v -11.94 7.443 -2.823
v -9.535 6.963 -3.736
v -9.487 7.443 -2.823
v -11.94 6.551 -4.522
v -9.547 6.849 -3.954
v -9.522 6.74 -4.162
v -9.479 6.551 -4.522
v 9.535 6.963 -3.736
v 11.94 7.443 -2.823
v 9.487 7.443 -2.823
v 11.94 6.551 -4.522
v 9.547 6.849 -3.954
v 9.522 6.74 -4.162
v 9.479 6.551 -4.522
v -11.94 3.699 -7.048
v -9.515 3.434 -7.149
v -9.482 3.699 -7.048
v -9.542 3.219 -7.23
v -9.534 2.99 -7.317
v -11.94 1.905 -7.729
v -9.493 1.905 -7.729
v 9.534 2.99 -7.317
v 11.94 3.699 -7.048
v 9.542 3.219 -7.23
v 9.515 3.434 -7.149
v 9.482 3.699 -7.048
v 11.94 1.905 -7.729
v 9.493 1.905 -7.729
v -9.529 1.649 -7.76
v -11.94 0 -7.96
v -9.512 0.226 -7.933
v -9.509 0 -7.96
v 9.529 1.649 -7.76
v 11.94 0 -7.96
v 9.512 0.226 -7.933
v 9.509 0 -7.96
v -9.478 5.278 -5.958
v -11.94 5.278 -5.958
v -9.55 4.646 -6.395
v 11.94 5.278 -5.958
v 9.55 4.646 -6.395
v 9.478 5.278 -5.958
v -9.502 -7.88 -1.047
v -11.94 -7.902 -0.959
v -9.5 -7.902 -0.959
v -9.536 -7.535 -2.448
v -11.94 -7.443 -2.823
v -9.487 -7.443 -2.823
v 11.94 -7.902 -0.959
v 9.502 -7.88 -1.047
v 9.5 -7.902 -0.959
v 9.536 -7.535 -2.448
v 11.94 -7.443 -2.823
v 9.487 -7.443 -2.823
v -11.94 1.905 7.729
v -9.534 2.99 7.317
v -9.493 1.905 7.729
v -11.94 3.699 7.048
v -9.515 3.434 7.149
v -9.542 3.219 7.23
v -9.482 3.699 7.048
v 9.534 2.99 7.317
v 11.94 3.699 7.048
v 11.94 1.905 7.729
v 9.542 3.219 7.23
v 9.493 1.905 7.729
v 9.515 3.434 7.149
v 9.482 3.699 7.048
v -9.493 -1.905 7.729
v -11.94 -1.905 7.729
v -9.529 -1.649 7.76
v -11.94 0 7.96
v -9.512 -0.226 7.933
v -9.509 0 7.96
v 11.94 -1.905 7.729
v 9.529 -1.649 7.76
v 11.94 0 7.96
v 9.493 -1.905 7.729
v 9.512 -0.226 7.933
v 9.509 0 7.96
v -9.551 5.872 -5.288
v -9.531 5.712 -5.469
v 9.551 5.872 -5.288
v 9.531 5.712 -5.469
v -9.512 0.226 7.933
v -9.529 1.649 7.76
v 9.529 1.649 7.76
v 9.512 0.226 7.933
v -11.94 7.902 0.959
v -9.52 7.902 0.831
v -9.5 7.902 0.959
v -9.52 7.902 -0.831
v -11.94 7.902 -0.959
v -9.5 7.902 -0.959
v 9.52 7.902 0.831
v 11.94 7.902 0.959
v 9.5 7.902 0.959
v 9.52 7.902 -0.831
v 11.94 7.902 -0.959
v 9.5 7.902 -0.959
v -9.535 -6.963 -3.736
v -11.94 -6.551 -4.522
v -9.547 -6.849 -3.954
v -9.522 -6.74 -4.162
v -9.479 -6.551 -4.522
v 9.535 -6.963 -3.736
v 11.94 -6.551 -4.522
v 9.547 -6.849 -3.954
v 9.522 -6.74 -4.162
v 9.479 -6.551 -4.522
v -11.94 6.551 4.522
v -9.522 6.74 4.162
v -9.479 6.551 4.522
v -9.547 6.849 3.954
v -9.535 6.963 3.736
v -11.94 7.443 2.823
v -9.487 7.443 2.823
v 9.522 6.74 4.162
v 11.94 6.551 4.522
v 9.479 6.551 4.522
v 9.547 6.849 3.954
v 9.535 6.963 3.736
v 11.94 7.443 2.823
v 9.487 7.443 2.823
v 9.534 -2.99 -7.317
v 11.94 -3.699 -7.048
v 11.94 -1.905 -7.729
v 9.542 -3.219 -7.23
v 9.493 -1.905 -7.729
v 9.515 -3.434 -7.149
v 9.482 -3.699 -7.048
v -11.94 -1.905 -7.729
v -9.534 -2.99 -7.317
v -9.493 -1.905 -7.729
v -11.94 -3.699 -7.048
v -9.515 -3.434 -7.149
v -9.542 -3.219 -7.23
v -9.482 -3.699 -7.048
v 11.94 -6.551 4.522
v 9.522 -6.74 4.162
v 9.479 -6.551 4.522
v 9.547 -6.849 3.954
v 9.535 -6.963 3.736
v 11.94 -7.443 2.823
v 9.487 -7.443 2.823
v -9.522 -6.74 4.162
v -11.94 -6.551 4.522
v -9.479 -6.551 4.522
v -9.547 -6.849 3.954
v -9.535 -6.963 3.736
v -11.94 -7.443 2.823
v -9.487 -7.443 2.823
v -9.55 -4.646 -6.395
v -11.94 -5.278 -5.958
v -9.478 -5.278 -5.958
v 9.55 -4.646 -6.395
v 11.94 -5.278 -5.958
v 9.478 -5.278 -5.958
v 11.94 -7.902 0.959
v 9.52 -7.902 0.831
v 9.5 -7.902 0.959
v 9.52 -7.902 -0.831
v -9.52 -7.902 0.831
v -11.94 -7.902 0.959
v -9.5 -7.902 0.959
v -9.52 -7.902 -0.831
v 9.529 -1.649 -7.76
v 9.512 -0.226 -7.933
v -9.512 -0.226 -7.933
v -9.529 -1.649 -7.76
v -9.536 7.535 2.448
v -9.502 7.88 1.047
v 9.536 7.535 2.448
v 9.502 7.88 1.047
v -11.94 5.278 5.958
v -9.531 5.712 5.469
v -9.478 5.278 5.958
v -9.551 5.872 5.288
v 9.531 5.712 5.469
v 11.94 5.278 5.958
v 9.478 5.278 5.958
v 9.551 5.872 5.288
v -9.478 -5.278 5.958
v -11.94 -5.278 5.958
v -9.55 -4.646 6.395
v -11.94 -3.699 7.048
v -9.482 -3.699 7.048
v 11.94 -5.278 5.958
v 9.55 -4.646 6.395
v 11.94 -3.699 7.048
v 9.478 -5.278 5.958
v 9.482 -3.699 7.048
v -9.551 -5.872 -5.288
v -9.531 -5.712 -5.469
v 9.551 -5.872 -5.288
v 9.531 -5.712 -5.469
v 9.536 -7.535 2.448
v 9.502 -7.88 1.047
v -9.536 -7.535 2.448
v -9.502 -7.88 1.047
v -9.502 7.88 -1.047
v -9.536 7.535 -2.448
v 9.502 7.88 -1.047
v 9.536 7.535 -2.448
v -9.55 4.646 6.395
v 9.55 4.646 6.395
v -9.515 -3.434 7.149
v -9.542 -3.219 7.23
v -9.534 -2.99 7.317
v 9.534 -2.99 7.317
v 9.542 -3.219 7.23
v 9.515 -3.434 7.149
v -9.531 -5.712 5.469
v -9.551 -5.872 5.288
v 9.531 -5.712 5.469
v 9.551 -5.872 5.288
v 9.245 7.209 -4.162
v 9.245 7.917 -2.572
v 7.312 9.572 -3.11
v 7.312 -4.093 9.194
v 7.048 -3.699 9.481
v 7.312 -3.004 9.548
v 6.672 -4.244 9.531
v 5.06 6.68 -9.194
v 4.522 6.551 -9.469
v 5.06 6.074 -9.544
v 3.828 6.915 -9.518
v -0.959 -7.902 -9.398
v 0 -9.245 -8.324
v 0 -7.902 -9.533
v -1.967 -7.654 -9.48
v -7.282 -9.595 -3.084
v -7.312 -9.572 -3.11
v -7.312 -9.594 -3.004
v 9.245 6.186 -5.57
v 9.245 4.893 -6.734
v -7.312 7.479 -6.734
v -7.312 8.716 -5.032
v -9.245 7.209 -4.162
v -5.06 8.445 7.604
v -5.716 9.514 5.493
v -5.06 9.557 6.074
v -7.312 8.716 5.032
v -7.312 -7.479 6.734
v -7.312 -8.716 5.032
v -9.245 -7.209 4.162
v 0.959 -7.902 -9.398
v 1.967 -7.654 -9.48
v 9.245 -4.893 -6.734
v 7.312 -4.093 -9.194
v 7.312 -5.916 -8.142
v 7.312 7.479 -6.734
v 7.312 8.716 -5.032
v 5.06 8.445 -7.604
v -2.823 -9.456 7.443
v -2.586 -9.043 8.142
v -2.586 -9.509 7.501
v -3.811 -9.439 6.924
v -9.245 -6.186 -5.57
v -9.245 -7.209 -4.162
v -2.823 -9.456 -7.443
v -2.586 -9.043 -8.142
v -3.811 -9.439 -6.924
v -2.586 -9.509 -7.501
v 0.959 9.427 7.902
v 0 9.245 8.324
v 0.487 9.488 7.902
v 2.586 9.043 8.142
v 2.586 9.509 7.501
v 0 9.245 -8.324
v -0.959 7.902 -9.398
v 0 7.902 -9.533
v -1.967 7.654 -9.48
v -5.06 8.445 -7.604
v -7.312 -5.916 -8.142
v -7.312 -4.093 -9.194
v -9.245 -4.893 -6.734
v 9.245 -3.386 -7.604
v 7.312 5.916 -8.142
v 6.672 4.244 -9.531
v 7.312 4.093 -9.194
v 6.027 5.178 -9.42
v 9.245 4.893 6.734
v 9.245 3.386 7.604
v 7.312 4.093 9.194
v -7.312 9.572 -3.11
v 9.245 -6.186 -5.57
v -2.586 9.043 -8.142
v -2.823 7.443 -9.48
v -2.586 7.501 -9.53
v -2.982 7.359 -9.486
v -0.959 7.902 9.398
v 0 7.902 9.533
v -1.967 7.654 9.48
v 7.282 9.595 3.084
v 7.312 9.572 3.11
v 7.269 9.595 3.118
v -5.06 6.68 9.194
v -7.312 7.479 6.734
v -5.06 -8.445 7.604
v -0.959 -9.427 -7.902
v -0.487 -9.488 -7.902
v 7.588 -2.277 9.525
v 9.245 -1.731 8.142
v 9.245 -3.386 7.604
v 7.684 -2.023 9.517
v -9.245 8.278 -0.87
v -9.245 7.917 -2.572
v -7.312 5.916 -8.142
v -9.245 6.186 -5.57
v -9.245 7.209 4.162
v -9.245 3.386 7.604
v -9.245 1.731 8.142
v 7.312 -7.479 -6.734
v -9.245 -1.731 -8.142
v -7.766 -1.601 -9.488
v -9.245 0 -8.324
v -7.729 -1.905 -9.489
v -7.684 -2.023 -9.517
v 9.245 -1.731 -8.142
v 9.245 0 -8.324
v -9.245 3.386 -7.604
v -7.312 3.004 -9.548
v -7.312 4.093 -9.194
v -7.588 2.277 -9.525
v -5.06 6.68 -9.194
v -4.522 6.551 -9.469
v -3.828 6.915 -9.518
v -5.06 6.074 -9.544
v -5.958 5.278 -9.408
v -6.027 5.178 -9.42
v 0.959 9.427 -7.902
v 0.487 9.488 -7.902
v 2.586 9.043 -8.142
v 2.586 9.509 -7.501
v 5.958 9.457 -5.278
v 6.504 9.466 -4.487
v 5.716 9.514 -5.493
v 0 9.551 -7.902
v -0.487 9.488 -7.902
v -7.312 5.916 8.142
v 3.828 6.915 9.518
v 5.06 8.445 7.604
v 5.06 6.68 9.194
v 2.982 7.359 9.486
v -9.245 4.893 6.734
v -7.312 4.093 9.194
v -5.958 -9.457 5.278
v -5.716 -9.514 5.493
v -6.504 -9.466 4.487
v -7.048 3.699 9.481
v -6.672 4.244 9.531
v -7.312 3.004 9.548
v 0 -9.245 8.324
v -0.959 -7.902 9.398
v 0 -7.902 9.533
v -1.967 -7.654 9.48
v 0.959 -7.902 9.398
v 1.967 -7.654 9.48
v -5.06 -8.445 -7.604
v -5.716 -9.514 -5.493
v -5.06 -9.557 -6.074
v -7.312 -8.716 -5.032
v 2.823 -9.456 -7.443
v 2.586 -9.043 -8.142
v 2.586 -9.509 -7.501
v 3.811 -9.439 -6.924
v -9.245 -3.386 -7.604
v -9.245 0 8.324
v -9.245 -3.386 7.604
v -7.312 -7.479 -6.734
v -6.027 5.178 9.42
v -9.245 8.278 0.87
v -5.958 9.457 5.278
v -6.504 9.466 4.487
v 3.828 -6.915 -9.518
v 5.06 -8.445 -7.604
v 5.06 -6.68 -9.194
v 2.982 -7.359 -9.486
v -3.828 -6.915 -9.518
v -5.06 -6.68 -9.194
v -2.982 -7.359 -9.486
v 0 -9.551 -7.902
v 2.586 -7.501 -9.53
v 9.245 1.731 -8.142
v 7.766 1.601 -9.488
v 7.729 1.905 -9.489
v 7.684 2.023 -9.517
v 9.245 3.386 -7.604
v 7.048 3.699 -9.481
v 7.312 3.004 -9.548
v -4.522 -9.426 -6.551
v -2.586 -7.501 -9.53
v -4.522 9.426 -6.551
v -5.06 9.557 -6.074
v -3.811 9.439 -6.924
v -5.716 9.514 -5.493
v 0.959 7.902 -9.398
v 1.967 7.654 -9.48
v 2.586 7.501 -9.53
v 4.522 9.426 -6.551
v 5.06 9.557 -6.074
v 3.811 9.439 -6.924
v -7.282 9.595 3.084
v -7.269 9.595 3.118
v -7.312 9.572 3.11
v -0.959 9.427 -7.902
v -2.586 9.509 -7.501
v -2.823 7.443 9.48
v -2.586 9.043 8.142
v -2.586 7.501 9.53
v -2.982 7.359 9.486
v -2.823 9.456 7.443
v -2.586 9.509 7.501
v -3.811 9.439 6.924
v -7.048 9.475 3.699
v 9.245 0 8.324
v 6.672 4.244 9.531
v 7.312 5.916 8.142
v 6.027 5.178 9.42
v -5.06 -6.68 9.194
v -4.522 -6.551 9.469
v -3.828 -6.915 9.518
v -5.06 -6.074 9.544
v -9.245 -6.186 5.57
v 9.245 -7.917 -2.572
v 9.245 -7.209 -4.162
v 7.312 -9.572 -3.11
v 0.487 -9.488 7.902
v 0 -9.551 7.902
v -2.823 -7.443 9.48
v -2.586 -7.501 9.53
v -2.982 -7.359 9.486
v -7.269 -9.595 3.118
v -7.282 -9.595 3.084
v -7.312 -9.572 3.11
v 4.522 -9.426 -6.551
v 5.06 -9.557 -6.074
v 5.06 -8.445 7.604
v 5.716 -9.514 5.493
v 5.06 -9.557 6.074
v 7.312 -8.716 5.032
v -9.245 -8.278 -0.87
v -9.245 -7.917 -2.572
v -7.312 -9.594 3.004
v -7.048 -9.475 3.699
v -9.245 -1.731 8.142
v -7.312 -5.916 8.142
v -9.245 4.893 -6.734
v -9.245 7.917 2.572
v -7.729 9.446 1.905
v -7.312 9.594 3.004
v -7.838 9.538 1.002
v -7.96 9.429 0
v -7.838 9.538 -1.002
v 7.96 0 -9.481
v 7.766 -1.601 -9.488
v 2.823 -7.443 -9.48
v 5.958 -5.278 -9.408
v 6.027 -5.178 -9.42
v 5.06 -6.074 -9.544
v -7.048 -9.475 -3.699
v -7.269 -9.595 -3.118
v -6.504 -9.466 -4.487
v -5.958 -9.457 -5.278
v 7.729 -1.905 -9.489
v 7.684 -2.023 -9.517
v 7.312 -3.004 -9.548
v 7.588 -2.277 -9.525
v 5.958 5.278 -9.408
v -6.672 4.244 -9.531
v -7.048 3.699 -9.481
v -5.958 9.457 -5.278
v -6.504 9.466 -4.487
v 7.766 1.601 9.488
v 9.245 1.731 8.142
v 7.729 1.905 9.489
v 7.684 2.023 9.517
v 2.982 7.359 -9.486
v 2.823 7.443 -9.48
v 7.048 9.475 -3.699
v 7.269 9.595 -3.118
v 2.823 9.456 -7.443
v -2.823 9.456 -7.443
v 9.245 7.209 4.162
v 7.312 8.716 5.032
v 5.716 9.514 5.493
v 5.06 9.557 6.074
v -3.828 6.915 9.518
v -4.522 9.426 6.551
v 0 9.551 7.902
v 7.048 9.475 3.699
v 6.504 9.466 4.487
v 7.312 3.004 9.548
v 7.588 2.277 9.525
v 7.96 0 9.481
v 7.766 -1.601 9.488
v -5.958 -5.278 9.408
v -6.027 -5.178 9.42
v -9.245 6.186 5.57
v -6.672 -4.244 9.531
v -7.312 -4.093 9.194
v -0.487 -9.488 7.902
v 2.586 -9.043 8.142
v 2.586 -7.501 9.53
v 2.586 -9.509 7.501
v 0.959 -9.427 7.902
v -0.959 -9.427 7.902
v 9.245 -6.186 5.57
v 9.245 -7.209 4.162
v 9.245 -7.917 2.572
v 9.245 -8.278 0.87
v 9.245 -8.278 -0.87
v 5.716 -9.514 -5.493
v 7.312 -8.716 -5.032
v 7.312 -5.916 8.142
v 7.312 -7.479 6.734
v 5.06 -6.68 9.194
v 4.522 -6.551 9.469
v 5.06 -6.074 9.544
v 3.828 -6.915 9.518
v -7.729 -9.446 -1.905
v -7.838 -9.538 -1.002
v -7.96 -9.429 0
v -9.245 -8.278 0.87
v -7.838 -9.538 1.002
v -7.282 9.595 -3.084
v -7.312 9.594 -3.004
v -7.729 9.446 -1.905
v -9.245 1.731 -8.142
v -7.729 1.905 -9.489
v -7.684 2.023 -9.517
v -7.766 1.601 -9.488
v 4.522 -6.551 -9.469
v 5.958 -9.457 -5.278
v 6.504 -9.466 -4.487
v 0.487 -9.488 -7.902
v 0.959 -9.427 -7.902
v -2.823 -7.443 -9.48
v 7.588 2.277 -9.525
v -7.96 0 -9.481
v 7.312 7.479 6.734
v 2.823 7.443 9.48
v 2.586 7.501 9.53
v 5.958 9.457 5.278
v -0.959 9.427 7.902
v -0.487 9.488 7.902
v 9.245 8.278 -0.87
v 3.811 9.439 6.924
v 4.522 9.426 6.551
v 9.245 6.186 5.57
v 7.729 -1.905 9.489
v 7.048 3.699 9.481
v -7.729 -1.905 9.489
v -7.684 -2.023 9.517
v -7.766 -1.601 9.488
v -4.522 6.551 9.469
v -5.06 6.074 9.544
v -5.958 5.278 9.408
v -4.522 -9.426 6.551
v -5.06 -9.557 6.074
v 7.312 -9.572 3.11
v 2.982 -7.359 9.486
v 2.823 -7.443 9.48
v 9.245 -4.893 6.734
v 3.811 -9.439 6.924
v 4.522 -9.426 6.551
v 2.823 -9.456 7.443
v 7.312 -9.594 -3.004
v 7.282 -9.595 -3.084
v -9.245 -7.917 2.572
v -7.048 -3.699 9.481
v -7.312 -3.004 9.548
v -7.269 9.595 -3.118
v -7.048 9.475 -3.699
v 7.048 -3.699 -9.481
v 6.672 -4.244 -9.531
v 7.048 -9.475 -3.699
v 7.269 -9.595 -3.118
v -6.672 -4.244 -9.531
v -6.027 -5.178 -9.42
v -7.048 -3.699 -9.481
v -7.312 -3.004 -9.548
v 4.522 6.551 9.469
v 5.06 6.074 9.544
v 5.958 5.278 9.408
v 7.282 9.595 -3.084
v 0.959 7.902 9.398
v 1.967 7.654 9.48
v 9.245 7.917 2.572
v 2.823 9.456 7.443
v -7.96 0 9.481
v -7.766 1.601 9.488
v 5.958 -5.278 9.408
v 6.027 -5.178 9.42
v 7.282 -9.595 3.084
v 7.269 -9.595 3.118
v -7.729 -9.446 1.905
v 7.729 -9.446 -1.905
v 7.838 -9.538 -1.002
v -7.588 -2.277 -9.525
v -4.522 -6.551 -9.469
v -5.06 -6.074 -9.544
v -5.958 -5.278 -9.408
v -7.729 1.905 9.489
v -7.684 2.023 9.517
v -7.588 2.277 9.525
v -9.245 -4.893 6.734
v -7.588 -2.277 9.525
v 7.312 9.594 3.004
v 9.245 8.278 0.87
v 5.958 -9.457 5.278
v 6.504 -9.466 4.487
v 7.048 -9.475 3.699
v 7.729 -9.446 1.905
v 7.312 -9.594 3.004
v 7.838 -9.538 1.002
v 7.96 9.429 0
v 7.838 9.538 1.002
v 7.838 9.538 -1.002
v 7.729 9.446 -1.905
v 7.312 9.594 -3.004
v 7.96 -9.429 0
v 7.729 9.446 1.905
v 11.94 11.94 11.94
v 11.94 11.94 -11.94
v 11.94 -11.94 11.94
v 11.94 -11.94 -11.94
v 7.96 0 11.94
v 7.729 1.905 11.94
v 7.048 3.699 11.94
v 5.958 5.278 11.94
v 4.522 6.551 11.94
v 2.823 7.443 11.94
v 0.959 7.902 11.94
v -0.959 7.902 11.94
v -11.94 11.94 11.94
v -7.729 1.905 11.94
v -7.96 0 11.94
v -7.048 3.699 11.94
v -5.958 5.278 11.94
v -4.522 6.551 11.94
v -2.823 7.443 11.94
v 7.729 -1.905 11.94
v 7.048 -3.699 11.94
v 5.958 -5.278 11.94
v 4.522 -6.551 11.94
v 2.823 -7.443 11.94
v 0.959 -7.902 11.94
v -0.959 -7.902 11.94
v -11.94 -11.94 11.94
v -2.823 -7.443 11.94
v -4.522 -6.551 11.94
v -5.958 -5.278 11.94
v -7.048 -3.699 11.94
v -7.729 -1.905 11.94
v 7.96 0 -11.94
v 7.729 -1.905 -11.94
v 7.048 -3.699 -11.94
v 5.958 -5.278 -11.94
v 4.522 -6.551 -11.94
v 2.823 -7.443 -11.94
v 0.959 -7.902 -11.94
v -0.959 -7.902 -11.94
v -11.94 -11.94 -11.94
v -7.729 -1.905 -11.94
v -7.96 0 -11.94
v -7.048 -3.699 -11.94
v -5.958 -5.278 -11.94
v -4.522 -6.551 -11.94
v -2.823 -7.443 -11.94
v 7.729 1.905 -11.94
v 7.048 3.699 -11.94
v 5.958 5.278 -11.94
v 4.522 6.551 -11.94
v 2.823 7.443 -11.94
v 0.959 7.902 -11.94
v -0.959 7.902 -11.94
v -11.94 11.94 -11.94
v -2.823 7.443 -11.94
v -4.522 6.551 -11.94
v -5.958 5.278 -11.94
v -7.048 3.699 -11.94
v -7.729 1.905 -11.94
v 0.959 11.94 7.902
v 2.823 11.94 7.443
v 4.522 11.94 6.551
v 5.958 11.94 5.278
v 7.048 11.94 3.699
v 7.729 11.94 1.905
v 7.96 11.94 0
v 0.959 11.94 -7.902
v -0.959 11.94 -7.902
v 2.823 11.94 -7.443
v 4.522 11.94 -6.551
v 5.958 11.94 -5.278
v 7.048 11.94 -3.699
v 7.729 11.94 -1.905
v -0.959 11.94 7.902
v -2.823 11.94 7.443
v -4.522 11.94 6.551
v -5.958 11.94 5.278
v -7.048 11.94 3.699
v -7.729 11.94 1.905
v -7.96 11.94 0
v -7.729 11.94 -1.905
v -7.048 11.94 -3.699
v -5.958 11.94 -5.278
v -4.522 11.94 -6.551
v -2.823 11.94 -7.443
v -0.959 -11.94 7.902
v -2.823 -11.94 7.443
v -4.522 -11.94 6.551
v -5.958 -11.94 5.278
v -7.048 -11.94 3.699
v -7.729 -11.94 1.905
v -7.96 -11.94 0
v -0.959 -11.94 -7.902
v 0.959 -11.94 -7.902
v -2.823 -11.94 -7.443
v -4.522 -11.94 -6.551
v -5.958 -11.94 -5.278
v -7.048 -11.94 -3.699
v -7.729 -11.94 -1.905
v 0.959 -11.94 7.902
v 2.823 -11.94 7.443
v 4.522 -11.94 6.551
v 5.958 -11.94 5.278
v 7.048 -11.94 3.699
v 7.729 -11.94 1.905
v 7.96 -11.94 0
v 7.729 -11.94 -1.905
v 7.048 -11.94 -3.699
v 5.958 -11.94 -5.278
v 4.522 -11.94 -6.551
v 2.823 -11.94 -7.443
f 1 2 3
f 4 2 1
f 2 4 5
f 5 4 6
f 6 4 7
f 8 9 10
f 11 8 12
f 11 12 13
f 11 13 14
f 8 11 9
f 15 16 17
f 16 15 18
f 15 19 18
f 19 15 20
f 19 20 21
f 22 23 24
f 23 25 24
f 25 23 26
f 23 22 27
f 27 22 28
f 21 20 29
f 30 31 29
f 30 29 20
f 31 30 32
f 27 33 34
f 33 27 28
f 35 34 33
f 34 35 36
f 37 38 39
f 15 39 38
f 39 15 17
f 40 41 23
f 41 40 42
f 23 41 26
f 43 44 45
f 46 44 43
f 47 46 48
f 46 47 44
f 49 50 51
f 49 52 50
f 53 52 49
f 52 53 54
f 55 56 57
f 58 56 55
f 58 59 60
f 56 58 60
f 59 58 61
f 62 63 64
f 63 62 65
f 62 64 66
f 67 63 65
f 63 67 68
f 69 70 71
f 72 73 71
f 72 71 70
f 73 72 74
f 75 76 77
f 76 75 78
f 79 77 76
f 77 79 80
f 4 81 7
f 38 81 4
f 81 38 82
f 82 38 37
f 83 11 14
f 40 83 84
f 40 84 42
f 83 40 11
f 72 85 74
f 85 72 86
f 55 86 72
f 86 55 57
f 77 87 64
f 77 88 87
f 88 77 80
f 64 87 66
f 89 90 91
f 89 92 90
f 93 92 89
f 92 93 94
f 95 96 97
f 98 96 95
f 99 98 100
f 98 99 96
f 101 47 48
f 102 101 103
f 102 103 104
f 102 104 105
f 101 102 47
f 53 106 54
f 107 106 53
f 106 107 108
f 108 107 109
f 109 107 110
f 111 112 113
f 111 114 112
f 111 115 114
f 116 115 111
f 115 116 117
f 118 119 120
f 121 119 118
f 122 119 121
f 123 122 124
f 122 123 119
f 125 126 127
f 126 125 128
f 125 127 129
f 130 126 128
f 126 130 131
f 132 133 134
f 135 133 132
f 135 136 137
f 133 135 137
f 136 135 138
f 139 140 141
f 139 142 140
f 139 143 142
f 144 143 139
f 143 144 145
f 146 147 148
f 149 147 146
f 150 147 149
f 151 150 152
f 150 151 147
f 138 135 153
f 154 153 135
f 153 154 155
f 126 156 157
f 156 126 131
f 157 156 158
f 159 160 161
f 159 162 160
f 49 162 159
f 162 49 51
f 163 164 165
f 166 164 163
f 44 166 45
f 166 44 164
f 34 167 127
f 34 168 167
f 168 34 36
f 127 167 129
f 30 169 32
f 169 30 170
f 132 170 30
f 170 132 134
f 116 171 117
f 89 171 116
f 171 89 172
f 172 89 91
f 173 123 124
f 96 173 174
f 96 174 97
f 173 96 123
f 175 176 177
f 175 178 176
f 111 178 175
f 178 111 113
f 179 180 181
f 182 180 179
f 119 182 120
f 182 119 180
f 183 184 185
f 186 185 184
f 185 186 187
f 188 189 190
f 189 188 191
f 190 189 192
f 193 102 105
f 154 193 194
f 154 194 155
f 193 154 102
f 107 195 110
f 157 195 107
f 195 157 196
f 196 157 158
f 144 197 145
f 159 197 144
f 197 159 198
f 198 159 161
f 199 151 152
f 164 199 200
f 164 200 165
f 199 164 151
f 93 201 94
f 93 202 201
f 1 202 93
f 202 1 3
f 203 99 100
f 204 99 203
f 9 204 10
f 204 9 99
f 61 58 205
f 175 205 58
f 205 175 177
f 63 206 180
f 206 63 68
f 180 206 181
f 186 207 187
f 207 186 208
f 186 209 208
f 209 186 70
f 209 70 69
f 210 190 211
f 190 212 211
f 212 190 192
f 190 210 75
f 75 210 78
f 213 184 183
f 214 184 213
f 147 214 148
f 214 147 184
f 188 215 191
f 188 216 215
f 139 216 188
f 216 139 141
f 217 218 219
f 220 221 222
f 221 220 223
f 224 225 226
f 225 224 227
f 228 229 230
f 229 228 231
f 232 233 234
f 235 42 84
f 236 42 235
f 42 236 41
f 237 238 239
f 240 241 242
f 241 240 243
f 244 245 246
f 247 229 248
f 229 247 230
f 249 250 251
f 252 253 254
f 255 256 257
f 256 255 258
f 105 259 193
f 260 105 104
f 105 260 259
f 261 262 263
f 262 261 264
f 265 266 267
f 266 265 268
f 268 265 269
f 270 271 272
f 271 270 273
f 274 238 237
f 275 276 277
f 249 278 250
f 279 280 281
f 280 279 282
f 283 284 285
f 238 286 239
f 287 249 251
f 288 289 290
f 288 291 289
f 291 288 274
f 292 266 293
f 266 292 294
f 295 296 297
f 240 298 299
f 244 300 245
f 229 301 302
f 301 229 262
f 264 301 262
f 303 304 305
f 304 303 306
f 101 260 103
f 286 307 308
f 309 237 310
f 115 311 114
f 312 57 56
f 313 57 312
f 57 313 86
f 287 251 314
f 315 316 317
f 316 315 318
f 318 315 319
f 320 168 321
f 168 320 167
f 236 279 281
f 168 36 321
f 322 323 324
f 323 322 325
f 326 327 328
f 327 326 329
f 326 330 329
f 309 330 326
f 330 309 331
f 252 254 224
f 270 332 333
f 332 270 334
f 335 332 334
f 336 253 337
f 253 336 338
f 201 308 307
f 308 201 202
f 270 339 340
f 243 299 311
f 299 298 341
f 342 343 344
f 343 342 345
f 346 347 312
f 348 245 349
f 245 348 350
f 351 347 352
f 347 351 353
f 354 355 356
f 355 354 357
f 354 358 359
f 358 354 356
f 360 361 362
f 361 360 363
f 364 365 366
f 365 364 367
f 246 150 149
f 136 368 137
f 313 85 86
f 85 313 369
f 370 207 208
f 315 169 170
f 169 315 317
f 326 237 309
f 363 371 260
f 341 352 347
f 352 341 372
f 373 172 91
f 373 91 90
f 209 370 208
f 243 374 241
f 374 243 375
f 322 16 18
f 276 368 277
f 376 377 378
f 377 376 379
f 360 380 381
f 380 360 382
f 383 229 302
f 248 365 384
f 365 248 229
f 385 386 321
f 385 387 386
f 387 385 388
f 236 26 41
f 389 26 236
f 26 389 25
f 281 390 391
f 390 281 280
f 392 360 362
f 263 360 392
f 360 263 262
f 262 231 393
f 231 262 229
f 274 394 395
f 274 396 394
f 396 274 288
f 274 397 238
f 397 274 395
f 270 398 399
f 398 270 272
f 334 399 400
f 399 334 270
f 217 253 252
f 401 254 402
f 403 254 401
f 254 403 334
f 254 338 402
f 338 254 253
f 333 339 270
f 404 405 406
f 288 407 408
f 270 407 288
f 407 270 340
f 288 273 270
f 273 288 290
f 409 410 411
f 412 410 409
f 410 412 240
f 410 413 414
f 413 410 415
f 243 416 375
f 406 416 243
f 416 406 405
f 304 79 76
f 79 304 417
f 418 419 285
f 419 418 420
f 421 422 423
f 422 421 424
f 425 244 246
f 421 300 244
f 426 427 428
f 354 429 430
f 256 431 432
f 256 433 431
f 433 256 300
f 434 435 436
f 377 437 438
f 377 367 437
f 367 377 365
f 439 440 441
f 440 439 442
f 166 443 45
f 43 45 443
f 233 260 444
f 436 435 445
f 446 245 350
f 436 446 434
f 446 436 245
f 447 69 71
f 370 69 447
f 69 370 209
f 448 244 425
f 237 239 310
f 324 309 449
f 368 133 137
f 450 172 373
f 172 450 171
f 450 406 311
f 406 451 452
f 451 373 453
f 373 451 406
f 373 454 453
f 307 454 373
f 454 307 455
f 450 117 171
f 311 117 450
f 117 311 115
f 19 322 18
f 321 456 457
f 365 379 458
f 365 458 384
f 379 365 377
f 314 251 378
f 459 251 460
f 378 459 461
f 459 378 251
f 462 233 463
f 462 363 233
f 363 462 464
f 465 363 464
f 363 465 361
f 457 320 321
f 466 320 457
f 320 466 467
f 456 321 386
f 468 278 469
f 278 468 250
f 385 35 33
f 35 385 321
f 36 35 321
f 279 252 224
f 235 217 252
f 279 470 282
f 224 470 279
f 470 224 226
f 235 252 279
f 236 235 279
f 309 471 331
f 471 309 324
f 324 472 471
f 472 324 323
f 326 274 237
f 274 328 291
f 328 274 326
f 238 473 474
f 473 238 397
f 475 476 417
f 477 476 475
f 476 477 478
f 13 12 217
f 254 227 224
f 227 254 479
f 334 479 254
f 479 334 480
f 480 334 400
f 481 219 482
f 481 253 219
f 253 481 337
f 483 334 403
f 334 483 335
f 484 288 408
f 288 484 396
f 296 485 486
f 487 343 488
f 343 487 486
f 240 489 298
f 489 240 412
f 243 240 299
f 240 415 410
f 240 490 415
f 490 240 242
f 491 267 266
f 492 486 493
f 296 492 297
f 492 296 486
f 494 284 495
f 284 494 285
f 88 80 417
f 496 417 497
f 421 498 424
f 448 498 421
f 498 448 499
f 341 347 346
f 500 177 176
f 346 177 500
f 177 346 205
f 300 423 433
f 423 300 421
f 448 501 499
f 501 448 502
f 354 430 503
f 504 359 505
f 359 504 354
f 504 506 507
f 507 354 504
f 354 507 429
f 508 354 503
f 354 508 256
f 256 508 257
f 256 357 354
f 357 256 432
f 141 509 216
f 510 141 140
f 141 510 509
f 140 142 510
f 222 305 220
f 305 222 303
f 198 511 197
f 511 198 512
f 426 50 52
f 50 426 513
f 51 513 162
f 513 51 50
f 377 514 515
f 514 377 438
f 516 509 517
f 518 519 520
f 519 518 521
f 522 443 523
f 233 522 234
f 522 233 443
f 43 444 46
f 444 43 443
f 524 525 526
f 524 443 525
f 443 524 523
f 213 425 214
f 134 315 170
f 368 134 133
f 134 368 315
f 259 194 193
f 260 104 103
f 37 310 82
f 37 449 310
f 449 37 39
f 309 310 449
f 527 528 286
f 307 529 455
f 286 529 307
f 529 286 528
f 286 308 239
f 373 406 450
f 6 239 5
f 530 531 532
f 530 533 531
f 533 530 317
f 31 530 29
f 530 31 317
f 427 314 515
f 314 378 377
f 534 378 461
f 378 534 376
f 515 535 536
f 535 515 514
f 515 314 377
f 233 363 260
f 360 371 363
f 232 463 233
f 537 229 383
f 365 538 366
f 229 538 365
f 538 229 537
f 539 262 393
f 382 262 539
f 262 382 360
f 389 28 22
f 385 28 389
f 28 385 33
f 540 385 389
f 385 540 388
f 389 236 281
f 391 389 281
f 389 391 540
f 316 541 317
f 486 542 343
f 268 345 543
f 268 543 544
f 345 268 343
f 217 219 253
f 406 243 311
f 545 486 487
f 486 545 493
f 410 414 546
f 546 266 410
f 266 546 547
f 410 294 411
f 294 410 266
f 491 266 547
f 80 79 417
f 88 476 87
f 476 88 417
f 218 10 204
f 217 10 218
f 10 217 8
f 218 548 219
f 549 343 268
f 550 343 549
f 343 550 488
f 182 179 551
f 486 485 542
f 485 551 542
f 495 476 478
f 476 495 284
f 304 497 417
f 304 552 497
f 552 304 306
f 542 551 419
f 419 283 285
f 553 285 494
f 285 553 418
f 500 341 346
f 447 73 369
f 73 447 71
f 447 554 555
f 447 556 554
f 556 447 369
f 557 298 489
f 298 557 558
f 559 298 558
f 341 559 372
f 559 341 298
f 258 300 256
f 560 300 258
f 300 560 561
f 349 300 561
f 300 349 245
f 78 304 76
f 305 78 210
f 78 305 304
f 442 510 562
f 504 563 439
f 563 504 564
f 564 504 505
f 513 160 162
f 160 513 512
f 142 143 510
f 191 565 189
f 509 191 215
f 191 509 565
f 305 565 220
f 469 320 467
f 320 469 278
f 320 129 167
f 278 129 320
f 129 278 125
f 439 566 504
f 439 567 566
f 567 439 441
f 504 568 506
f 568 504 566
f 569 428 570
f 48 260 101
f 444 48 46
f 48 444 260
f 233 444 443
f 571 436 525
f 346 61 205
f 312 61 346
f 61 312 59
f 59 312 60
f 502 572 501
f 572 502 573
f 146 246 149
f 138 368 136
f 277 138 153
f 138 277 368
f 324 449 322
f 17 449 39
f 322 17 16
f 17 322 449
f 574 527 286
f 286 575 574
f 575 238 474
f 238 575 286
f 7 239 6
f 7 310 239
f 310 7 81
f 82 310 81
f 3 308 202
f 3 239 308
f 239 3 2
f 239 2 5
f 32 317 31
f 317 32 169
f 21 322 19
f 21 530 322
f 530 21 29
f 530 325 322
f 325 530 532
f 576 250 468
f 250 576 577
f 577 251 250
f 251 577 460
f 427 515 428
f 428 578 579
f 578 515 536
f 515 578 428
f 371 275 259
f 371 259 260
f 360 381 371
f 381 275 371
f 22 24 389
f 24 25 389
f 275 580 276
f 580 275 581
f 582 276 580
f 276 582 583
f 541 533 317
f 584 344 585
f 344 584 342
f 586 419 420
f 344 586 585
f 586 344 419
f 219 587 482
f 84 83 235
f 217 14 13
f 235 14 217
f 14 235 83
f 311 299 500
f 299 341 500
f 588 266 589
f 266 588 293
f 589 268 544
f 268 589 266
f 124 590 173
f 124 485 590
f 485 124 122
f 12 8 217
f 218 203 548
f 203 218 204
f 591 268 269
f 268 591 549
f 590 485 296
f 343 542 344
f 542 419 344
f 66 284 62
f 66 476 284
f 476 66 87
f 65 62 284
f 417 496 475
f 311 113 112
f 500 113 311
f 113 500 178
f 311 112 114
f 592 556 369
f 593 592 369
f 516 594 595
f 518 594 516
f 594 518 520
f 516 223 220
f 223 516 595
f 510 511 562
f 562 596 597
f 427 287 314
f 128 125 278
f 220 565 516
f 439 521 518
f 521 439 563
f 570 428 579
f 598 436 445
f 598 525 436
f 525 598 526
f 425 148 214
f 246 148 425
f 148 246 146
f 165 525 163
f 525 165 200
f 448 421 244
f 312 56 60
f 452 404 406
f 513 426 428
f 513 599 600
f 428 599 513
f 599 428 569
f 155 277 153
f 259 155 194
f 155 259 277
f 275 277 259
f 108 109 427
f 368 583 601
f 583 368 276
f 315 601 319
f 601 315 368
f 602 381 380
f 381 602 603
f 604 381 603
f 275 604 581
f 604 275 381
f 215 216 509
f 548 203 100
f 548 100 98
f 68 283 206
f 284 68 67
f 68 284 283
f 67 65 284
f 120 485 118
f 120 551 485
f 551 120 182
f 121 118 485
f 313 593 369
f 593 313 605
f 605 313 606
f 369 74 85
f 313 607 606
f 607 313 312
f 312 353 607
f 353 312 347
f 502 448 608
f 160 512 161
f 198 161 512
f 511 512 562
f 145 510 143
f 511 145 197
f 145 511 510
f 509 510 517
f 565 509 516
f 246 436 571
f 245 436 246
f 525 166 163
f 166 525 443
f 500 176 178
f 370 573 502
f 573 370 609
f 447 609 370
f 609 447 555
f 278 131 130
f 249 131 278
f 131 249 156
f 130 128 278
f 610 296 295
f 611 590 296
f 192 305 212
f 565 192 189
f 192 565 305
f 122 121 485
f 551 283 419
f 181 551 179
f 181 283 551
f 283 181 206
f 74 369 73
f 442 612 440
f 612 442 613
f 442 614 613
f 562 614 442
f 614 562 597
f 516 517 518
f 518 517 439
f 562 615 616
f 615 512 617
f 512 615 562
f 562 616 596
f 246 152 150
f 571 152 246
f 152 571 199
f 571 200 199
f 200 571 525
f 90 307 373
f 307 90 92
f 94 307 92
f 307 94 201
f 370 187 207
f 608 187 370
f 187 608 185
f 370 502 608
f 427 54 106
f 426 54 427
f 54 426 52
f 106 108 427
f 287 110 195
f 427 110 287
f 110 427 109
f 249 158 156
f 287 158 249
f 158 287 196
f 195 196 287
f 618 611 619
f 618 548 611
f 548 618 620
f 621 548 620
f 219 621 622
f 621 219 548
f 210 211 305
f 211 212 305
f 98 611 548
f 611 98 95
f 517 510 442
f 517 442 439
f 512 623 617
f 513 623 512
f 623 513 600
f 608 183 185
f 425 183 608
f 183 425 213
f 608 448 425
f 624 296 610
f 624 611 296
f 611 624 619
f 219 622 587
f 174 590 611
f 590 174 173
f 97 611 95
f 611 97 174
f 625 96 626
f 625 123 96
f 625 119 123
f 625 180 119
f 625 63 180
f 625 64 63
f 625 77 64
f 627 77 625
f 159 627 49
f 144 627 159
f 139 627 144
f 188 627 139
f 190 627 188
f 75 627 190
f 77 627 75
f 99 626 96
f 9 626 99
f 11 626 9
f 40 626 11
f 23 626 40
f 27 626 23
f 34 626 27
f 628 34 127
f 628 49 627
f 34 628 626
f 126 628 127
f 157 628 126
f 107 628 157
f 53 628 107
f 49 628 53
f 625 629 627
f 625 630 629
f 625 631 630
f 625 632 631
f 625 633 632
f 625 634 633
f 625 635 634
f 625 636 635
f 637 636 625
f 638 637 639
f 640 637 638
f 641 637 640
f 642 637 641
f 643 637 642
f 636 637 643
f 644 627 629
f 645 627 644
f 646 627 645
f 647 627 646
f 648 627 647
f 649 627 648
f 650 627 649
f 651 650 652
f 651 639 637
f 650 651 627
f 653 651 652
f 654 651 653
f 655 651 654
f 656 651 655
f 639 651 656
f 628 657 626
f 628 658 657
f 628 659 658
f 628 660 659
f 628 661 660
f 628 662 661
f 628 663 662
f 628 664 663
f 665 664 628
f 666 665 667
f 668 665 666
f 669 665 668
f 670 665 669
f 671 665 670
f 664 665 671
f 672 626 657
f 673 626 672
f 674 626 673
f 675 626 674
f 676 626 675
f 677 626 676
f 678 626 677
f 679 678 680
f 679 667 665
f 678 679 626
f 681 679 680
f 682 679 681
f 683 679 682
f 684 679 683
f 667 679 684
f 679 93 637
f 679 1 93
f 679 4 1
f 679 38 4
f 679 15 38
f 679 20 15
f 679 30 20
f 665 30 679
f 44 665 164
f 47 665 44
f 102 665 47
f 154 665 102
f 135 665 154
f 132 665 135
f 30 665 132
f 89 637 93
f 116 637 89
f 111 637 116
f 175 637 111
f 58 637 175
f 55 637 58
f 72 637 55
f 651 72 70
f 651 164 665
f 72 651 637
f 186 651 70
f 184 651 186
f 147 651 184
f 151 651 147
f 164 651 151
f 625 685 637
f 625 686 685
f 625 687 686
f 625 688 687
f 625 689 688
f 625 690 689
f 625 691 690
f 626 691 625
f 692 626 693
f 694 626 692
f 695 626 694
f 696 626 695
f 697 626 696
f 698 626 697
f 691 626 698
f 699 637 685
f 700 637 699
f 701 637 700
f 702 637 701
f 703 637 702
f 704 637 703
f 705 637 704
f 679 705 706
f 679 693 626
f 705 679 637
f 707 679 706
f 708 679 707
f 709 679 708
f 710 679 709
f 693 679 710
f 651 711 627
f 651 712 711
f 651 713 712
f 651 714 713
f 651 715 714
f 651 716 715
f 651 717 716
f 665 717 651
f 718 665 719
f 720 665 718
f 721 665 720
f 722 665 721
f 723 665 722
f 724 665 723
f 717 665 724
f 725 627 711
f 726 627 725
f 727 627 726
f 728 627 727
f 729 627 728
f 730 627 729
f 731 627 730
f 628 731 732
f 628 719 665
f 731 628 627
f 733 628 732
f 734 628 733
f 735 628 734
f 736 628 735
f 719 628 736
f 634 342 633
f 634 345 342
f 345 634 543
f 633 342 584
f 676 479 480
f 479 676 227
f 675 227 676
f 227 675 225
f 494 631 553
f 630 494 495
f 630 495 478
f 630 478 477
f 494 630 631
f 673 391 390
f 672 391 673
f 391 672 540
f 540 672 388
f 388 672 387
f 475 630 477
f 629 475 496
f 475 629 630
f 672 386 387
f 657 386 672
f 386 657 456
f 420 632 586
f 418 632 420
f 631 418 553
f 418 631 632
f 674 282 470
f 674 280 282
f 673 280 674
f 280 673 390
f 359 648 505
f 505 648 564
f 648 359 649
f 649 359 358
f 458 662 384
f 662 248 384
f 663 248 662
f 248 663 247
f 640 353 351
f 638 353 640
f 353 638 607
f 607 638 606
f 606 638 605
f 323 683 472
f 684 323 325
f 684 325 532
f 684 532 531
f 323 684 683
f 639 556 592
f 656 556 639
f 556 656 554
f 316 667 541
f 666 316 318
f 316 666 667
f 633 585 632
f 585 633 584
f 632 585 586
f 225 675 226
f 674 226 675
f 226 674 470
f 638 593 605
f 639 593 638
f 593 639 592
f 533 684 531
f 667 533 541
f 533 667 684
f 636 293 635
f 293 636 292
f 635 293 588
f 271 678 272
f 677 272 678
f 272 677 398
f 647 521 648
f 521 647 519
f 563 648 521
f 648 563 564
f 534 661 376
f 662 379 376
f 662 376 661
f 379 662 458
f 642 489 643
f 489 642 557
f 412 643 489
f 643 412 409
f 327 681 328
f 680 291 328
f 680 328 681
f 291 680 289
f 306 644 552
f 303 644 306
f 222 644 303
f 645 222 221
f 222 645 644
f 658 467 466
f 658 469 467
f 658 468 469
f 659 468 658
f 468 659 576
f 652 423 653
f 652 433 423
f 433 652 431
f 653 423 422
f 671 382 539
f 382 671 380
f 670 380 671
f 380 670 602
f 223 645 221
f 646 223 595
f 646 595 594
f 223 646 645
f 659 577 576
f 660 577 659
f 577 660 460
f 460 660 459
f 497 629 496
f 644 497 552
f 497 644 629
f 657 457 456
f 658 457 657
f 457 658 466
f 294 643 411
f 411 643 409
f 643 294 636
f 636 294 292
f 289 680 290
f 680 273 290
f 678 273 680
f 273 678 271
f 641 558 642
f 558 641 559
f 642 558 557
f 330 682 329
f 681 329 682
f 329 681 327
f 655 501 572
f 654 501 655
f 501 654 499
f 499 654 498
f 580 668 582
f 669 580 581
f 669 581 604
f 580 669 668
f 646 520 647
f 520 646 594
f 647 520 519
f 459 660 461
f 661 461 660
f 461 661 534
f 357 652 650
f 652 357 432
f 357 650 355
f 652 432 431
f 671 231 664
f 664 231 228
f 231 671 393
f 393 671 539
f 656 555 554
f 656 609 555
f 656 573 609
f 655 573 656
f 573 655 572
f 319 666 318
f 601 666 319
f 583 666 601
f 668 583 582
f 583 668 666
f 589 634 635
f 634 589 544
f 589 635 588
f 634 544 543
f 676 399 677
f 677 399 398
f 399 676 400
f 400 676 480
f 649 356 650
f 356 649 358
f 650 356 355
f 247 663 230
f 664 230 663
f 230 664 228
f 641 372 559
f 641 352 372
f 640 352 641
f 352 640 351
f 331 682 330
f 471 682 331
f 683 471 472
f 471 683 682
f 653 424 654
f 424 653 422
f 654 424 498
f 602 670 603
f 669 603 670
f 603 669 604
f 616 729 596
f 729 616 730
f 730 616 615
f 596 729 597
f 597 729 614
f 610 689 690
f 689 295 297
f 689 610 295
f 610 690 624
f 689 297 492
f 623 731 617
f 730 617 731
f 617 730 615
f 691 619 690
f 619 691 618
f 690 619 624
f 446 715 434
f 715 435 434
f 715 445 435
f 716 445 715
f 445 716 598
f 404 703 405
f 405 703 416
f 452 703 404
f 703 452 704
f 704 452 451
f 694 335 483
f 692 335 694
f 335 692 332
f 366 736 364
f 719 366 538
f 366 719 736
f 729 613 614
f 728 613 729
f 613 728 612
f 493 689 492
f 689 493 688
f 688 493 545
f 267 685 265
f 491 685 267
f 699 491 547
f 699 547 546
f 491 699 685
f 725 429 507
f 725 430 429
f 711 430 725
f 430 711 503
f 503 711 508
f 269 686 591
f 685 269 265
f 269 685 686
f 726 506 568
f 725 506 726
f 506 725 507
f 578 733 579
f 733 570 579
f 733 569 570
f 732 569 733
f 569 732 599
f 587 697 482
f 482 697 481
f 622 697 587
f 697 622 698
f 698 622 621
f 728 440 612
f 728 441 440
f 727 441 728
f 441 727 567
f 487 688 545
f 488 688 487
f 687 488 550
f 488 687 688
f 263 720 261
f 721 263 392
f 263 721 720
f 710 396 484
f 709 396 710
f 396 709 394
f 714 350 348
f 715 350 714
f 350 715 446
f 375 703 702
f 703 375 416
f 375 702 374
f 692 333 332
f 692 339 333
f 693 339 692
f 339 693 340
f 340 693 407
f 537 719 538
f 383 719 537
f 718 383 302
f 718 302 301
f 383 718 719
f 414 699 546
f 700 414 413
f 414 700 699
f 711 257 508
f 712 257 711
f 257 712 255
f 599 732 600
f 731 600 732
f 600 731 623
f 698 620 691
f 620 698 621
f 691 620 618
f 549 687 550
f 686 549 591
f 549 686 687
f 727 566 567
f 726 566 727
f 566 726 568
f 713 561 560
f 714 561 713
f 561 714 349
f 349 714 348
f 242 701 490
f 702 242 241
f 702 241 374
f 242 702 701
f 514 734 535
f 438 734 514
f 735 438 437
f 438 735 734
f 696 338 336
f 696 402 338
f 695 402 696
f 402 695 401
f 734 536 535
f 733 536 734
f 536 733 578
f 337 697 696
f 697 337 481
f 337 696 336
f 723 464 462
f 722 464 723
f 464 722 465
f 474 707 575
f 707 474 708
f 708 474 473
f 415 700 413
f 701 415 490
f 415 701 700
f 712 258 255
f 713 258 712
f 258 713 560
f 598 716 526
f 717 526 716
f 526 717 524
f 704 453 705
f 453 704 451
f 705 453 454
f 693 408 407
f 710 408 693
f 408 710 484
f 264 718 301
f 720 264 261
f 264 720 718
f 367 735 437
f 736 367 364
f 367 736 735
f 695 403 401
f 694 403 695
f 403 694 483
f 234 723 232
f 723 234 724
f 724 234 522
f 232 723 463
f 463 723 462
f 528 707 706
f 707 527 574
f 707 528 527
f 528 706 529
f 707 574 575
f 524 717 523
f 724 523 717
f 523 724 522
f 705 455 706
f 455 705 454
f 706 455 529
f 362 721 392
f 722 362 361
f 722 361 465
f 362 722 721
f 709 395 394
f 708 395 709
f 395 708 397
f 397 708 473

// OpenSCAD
//Coin Trap: a 3D printed cage to hold a coin
//By jessicad2020
//v.0.1, 19 Nov 2018

//parameters
coin_d = 23.88; //diameter of a quarter
coin_th = 1.58; //thickness of a quarter
gap=1;

//the coin
%cylinder(d=coin_d, th=coin_th, center=true);

//the trap
difference() {
    cube(size=coin_d, center=true);
    cylinder(r=coin_d/3, h=coin_d*2, center=true);
    rotate([90,0,0]){
        cylinder(r=coin_d/3, h=coin_d*2, center=true);
    }
    rotate([0,90,0]){
        cylinder(r=coin_d/3, h=coin_d*2, center=true);
    sphere(d=coin_d+gap, center=true);
}
}
